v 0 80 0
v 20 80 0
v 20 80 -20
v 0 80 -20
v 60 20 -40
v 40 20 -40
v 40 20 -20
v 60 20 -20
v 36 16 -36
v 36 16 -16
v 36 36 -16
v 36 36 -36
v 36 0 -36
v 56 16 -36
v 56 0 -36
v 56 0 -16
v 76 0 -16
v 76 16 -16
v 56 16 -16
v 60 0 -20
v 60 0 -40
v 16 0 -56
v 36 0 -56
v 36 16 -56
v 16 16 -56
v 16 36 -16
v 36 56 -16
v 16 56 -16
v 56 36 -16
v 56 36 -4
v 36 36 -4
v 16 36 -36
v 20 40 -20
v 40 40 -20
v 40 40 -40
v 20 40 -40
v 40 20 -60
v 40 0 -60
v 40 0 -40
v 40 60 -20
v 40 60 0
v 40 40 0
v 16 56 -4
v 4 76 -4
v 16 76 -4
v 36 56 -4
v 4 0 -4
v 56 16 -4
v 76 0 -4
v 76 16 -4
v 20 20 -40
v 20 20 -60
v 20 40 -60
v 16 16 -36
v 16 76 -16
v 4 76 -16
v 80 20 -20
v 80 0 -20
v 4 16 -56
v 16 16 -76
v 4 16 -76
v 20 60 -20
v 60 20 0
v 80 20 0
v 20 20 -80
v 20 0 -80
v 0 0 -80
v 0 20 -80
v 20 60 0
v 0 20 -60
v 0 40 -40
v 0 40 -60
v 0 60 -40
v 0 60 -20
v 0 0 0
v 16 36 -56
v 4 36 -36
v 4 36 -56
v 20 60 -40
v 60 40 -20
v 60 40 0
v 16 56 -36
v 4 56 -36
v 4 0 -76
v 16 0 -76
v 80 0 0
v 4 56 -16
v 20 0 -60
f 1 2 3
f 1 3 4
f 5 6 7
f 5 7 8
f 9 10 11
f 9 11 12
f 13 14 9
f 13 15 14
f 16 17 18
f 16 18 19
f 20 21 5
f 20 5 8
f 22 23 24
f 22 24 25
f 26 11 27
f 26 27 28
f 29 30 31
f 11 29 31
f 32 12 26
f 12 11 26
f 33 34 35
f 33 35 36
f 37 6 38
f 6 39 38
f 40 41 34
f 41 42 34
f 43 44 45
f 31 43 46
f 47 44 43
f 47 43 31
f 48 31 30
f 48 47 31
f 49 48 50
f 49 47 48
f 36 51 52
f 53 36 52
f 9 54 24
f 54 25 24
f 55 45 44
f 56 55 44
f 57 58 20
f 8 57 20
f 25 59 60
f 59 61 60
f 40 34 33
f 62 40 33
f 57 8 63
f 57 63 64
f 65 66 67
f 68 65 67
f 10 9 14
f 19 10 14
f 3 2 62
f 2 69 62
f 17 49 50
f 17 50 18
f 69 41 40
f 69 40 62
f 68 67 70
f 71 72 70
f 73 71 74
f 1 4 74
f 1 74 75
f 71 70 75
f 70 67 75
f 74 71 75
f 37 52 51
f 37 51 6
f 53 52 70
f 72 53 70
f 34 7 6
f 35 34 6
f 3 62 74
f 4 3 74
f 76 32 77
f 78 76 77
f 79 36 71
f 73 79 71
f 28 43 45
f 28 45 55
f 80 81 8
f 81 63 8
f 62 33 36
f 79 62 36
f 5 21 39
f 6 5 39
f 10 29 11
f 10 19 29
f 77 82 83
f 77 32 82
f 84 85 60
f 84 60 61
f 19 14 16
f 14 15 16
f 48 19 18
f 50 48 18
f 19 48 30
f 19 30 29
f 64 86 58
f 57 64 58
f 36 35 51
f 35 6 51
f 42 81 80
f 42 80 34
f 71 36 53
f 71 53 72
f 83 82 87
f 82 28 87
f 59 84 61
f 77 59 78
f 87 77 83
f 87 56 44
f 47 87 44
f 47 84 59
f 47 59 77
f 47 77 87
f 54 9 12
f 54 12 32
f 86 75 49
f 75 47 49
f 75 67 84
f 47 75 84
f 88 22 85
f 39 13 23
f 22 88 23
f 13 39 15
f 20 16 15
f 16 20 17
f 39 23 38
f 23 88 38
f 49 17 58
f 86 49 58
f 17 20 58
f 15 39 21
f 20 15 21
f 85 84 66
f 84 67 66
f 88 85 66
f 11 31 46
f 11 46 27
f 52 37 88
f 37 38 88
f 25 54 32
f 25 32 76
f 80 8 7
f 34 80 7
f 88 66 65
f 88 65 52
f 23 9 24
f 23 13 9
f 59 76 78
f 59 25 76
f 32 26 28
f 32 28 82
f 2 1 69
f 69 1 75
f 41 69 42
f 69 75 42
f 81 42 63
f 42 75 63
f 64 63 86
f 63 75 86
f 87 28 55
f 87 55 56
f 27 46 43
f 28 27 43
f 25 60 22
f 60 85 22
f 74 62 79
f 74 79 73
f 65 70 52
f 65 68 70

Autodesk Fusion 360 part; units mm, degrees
sketch "Sketch1" plane through (0, 0, 0) normal (0, 1, 0) x (1, 0, 0)
  line L0 (0, 0) -> (20, 0)
  line L1 (0, 20) -> (0, 0)
  line L2 (20, 0) -> (40, 0)
  line L3 (40, 0) -> (60, 0)
  line L4 (60, 0) -> (80, 0)
  line L5 (80, 20) -> (60, 20)
  line L6 (80, 0) -> (80, 20)
  line L7 (0, 40) -> (0, 20)
  line L8 (0, 60) -> (0, 40)
  line L9 (20, 80) -> (0, 80)
  line L10 (20, 80) -> (20, 60)
  line L11 (0, 80) -> (0, 60)
  line L12 (40, 60) -> (20, 60)
  line L13 (40, 40) -> (40, 60)
  line L14 (60, 40) -> (40, 40)
  line L15 (60, 40) -> (60, 20)
  point P0 (20, 0)
  point P1 (40, 0)
  point P2 (60, 0)
  dimension "d1" = 20
  dimension "d2" = 20
extrude "Extrude1" add sketch "Sketch1" along normal blind 20
sketch "Sketch2" plane through (0, 20, 0) normal (0, 1, 0) x (-1, 0, 0)
  line L0 (-40, -40) -> (-40, -60)
  line L1 (-40, -60) -> (-20, -60)
  line L2 (-20, -60) -> (-20, -80)
  line L3 (-20, -80) -> (0, -80)
  line L4 (0, -80) -> (0, 0)
  line L5 (0, 0) -> (-80, 0)
  line L6 (-80, 0) -> (-80, -20)
  line L7 (-80, -20) -> (-60, -20)
  line L8 (-60, -20) -> (-60, -40)
  line L9 (-60, -40) -> (-40, -40)
  line L10 (0, 0) -> (-20, 0)
  line L11 (-20, -40) -> (-20, -60)
  line L12 (-20, -60) -> (0, -60)
  line L13 (0, -60) -> (0, 0)
  line L14 (-20, 0) -> (-40, 0)
  line L15 (-40, -40) -> (-20, -40)
  line L16 (-40, 0) -> (-60, 0)
  line L17 (-60, 0) -> (-60, -20)
  line L18 (-60, -20) -> (-40, -20)
  line L19 (-40, -20) -> (-40, -40)
  dimension "d21" = 20
  dimension "d22" = 60
  dimension "d23" = 20
  dimension "d24" = 40
  dimension "d25" = 20
  dimension "d26" = 20
extrude "Extrude2" add sketch "Sketch2" along normal blind 20 contours L4 L5 L10 L11 L12 L13 L14 L15 L16 L17 L18 L19
sketch "Sketch3" plane through (0, 40, 0) normal (0, 1, 0) x (-1, 0, 0)
  line L0 (-40, -20) -> (-40, -40)
  line L1 (-40, -40) -> (-20, -40)
  line L2 (-20, -40) -> (-20, -60)
  line L3 (-20, -60) -> (0, -60)
  line L4 (0, -60) -> (0, 0)
  line L5 (0, 0) -> (-60, 0)
  line L6 (-60, 0) -> (-60, -20)
  line L7 (-60, -20) -> (-40, -20)
  line L8 (0, 0) -> (-40, 0)
  line L9 (-40, 0) -> (-40, -20)
  line L10 (-40, -20) -> (-20, -20)
  line L11 (0, -20) -> (0, 0)
  line L12 (-20, -20) -> (-20, -40)
  line L13 (-20, -40) -> (0, -40)
  line L14 (0, -40) -> (0, -20)
  dimension "d29" = 40
  dimension "d30" = 20
  dimension "d31" = 20
  dimension "d32" = 20
extrude "Extrude3" add sketch "Sketch3" along normal blind 20 contours L4 L5 L8 L9 L10 L11 L12 L13 L14
sketch "Sketch4" plane through (0, 60, 0) normal (0, 1, 0) x (-1, 0, 0)
  line L0 (0, -40) -> (0, 0)
  line L1 (0, 0) -> (-40, 0)
  line L2 (-40, 0) -> (-40, -20)
  line L3 (-40, -20) -> (-20, -20)
  line L4 (-20, -20) -> (-20, -40)
  line L5 (-20, -40) -> (0, -40)
  line L6 (0, 0) -> (-20, 0)
  line L7 (-20, 0) -> (-20, -20)
  line L8 (-20, -20) -> (0, -20)
  line L9 (0, -20) -> (0, 0)
  dimension "d35" = 20
  dimension "d36" = 20
extrude "Extrude4" add sketch "Sketch4" along normal blind 20 contours L0 L1 L6 L7 L8 L9
shell "Shell1" thickness 4 removed faces 1 at (20, 0, -33.3333)
